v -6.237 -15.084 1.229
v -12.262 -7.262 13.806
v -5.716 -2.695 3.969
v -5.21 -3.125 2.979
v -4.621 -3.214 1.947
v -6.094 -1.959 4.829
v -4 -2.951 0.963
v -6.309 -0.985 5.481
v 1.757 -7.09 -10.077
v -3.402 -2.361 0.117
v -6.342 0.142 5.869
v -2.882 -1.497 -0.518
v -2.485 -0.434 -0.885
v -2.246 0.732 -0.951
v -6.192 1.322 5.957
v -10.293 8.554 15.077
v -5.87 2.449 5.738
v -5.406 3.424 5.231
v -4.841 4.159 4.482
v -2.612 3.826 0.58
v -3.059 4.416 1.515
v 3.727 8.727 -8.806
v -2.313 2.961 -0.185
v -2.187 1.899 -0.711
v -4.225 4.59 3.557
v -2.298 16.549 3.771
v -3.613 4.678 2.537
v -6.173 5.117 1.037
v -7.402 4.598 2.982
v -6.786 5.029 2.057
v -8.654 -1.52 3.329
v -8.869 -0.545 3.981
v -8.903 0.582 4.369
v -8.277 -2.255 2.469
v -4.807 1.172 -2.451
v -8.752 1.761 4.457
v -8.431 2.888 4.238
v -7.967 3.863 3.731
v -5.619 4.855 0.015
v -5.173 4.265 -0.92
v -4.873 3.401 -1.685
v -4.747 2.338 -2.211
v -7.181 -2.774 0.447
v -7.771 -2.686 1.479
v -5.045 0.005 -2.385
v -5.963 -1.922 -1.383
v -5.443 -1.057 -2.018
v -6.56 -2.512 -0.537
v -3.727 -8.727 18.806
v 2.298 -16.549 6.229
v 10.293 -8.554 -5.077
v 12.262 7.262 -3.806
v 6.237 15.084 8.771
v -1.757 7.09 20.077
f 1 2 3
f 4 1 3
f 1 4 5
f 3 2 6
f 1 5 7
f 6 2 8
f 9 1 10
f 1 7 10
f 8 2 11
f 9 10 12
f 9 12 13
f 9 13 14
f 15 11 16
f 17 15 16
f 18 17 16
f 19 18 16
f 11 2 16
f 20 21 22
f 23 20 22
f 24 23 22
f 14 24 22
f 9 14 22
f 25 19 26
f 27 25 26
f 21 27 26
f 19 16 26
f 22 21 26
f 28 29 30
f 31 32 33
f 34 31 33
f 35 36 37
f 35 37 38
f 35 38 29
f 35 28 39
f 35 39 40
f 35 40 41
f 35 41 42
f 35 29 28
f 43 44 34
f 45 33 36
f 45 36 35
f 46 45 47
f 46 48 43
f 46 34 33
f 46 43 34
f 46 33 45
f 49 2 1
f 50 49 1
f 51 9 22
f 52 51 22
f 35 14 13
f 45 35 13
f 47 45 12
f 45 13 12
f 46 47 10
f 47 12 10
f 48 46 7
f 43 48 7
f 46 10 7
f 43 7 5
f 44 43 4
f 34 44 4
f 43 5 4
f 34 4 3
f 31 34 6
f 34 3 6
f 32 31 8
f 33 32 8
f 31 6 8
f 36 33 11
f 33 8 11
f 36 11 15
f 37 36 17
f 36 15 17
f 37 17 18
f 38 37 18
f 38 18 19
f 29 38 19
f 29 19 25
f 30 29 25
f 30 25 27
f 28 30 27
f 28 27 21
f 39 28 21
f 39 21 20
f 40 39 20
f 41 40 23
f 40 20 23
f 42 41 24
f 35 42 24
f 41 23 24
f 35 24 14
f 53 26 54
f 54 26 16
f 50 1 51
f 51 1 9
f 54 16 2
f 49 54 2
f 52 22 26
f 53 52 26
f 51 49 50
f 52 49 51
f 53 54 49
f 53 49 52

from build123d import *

# Parameters (mm, degrees)
EXTRUDE_1_DEPTH   = 10
MOVE_BODY_1_ANGLE = 64.736825646
SKETCH_2_R        = 4
EXTRUDE_2_DEPTH   = 3


with BuildPart() as part:
    # 草图1 → 凸台-拉伸1 (new body)
    with BuildSketch(Plane.XY):
        Polygon((7.994684102, 13.847199055), (-7.994684102, 13.847199055), (-15.989368203, 0), (-7.994684102, -13.847199055), (7.994684102, -13.847199055), (15.989368203, 0), align=None)
    extrude(amount=EXTRUDE_1_DEPTH)


with BuildPart() as part_1:
    # Move Body 1: moved
    add(part.part.rotate(Axis((-0.638697904, -1.541953143, 4.361302096), (0.3574067443365927, 0.8628562094610174, 0.3574067443365927)), MOVE_BODY_1_ANGLE))

    # 草图2 → 凸台-拉伸2 (add)
    with BuildSketch(Plane(origin=(-2.133883476, 0.366116524, -1.25), x_dir=(-0.49279927982674293, 0.08455098936288066, 0.8660254037844396), z_dir=(-0.8535533905932747, 0.14644660940672574, -0.49999999999999845))):
        with Locations(Location((4.330127019, 0, 0), (0, 0, 175.096803722))):
            Circle(SKETCH_2_R)
    extrude(amount=EXTRUDE_2_DEPTH)


solid = part_1.part
